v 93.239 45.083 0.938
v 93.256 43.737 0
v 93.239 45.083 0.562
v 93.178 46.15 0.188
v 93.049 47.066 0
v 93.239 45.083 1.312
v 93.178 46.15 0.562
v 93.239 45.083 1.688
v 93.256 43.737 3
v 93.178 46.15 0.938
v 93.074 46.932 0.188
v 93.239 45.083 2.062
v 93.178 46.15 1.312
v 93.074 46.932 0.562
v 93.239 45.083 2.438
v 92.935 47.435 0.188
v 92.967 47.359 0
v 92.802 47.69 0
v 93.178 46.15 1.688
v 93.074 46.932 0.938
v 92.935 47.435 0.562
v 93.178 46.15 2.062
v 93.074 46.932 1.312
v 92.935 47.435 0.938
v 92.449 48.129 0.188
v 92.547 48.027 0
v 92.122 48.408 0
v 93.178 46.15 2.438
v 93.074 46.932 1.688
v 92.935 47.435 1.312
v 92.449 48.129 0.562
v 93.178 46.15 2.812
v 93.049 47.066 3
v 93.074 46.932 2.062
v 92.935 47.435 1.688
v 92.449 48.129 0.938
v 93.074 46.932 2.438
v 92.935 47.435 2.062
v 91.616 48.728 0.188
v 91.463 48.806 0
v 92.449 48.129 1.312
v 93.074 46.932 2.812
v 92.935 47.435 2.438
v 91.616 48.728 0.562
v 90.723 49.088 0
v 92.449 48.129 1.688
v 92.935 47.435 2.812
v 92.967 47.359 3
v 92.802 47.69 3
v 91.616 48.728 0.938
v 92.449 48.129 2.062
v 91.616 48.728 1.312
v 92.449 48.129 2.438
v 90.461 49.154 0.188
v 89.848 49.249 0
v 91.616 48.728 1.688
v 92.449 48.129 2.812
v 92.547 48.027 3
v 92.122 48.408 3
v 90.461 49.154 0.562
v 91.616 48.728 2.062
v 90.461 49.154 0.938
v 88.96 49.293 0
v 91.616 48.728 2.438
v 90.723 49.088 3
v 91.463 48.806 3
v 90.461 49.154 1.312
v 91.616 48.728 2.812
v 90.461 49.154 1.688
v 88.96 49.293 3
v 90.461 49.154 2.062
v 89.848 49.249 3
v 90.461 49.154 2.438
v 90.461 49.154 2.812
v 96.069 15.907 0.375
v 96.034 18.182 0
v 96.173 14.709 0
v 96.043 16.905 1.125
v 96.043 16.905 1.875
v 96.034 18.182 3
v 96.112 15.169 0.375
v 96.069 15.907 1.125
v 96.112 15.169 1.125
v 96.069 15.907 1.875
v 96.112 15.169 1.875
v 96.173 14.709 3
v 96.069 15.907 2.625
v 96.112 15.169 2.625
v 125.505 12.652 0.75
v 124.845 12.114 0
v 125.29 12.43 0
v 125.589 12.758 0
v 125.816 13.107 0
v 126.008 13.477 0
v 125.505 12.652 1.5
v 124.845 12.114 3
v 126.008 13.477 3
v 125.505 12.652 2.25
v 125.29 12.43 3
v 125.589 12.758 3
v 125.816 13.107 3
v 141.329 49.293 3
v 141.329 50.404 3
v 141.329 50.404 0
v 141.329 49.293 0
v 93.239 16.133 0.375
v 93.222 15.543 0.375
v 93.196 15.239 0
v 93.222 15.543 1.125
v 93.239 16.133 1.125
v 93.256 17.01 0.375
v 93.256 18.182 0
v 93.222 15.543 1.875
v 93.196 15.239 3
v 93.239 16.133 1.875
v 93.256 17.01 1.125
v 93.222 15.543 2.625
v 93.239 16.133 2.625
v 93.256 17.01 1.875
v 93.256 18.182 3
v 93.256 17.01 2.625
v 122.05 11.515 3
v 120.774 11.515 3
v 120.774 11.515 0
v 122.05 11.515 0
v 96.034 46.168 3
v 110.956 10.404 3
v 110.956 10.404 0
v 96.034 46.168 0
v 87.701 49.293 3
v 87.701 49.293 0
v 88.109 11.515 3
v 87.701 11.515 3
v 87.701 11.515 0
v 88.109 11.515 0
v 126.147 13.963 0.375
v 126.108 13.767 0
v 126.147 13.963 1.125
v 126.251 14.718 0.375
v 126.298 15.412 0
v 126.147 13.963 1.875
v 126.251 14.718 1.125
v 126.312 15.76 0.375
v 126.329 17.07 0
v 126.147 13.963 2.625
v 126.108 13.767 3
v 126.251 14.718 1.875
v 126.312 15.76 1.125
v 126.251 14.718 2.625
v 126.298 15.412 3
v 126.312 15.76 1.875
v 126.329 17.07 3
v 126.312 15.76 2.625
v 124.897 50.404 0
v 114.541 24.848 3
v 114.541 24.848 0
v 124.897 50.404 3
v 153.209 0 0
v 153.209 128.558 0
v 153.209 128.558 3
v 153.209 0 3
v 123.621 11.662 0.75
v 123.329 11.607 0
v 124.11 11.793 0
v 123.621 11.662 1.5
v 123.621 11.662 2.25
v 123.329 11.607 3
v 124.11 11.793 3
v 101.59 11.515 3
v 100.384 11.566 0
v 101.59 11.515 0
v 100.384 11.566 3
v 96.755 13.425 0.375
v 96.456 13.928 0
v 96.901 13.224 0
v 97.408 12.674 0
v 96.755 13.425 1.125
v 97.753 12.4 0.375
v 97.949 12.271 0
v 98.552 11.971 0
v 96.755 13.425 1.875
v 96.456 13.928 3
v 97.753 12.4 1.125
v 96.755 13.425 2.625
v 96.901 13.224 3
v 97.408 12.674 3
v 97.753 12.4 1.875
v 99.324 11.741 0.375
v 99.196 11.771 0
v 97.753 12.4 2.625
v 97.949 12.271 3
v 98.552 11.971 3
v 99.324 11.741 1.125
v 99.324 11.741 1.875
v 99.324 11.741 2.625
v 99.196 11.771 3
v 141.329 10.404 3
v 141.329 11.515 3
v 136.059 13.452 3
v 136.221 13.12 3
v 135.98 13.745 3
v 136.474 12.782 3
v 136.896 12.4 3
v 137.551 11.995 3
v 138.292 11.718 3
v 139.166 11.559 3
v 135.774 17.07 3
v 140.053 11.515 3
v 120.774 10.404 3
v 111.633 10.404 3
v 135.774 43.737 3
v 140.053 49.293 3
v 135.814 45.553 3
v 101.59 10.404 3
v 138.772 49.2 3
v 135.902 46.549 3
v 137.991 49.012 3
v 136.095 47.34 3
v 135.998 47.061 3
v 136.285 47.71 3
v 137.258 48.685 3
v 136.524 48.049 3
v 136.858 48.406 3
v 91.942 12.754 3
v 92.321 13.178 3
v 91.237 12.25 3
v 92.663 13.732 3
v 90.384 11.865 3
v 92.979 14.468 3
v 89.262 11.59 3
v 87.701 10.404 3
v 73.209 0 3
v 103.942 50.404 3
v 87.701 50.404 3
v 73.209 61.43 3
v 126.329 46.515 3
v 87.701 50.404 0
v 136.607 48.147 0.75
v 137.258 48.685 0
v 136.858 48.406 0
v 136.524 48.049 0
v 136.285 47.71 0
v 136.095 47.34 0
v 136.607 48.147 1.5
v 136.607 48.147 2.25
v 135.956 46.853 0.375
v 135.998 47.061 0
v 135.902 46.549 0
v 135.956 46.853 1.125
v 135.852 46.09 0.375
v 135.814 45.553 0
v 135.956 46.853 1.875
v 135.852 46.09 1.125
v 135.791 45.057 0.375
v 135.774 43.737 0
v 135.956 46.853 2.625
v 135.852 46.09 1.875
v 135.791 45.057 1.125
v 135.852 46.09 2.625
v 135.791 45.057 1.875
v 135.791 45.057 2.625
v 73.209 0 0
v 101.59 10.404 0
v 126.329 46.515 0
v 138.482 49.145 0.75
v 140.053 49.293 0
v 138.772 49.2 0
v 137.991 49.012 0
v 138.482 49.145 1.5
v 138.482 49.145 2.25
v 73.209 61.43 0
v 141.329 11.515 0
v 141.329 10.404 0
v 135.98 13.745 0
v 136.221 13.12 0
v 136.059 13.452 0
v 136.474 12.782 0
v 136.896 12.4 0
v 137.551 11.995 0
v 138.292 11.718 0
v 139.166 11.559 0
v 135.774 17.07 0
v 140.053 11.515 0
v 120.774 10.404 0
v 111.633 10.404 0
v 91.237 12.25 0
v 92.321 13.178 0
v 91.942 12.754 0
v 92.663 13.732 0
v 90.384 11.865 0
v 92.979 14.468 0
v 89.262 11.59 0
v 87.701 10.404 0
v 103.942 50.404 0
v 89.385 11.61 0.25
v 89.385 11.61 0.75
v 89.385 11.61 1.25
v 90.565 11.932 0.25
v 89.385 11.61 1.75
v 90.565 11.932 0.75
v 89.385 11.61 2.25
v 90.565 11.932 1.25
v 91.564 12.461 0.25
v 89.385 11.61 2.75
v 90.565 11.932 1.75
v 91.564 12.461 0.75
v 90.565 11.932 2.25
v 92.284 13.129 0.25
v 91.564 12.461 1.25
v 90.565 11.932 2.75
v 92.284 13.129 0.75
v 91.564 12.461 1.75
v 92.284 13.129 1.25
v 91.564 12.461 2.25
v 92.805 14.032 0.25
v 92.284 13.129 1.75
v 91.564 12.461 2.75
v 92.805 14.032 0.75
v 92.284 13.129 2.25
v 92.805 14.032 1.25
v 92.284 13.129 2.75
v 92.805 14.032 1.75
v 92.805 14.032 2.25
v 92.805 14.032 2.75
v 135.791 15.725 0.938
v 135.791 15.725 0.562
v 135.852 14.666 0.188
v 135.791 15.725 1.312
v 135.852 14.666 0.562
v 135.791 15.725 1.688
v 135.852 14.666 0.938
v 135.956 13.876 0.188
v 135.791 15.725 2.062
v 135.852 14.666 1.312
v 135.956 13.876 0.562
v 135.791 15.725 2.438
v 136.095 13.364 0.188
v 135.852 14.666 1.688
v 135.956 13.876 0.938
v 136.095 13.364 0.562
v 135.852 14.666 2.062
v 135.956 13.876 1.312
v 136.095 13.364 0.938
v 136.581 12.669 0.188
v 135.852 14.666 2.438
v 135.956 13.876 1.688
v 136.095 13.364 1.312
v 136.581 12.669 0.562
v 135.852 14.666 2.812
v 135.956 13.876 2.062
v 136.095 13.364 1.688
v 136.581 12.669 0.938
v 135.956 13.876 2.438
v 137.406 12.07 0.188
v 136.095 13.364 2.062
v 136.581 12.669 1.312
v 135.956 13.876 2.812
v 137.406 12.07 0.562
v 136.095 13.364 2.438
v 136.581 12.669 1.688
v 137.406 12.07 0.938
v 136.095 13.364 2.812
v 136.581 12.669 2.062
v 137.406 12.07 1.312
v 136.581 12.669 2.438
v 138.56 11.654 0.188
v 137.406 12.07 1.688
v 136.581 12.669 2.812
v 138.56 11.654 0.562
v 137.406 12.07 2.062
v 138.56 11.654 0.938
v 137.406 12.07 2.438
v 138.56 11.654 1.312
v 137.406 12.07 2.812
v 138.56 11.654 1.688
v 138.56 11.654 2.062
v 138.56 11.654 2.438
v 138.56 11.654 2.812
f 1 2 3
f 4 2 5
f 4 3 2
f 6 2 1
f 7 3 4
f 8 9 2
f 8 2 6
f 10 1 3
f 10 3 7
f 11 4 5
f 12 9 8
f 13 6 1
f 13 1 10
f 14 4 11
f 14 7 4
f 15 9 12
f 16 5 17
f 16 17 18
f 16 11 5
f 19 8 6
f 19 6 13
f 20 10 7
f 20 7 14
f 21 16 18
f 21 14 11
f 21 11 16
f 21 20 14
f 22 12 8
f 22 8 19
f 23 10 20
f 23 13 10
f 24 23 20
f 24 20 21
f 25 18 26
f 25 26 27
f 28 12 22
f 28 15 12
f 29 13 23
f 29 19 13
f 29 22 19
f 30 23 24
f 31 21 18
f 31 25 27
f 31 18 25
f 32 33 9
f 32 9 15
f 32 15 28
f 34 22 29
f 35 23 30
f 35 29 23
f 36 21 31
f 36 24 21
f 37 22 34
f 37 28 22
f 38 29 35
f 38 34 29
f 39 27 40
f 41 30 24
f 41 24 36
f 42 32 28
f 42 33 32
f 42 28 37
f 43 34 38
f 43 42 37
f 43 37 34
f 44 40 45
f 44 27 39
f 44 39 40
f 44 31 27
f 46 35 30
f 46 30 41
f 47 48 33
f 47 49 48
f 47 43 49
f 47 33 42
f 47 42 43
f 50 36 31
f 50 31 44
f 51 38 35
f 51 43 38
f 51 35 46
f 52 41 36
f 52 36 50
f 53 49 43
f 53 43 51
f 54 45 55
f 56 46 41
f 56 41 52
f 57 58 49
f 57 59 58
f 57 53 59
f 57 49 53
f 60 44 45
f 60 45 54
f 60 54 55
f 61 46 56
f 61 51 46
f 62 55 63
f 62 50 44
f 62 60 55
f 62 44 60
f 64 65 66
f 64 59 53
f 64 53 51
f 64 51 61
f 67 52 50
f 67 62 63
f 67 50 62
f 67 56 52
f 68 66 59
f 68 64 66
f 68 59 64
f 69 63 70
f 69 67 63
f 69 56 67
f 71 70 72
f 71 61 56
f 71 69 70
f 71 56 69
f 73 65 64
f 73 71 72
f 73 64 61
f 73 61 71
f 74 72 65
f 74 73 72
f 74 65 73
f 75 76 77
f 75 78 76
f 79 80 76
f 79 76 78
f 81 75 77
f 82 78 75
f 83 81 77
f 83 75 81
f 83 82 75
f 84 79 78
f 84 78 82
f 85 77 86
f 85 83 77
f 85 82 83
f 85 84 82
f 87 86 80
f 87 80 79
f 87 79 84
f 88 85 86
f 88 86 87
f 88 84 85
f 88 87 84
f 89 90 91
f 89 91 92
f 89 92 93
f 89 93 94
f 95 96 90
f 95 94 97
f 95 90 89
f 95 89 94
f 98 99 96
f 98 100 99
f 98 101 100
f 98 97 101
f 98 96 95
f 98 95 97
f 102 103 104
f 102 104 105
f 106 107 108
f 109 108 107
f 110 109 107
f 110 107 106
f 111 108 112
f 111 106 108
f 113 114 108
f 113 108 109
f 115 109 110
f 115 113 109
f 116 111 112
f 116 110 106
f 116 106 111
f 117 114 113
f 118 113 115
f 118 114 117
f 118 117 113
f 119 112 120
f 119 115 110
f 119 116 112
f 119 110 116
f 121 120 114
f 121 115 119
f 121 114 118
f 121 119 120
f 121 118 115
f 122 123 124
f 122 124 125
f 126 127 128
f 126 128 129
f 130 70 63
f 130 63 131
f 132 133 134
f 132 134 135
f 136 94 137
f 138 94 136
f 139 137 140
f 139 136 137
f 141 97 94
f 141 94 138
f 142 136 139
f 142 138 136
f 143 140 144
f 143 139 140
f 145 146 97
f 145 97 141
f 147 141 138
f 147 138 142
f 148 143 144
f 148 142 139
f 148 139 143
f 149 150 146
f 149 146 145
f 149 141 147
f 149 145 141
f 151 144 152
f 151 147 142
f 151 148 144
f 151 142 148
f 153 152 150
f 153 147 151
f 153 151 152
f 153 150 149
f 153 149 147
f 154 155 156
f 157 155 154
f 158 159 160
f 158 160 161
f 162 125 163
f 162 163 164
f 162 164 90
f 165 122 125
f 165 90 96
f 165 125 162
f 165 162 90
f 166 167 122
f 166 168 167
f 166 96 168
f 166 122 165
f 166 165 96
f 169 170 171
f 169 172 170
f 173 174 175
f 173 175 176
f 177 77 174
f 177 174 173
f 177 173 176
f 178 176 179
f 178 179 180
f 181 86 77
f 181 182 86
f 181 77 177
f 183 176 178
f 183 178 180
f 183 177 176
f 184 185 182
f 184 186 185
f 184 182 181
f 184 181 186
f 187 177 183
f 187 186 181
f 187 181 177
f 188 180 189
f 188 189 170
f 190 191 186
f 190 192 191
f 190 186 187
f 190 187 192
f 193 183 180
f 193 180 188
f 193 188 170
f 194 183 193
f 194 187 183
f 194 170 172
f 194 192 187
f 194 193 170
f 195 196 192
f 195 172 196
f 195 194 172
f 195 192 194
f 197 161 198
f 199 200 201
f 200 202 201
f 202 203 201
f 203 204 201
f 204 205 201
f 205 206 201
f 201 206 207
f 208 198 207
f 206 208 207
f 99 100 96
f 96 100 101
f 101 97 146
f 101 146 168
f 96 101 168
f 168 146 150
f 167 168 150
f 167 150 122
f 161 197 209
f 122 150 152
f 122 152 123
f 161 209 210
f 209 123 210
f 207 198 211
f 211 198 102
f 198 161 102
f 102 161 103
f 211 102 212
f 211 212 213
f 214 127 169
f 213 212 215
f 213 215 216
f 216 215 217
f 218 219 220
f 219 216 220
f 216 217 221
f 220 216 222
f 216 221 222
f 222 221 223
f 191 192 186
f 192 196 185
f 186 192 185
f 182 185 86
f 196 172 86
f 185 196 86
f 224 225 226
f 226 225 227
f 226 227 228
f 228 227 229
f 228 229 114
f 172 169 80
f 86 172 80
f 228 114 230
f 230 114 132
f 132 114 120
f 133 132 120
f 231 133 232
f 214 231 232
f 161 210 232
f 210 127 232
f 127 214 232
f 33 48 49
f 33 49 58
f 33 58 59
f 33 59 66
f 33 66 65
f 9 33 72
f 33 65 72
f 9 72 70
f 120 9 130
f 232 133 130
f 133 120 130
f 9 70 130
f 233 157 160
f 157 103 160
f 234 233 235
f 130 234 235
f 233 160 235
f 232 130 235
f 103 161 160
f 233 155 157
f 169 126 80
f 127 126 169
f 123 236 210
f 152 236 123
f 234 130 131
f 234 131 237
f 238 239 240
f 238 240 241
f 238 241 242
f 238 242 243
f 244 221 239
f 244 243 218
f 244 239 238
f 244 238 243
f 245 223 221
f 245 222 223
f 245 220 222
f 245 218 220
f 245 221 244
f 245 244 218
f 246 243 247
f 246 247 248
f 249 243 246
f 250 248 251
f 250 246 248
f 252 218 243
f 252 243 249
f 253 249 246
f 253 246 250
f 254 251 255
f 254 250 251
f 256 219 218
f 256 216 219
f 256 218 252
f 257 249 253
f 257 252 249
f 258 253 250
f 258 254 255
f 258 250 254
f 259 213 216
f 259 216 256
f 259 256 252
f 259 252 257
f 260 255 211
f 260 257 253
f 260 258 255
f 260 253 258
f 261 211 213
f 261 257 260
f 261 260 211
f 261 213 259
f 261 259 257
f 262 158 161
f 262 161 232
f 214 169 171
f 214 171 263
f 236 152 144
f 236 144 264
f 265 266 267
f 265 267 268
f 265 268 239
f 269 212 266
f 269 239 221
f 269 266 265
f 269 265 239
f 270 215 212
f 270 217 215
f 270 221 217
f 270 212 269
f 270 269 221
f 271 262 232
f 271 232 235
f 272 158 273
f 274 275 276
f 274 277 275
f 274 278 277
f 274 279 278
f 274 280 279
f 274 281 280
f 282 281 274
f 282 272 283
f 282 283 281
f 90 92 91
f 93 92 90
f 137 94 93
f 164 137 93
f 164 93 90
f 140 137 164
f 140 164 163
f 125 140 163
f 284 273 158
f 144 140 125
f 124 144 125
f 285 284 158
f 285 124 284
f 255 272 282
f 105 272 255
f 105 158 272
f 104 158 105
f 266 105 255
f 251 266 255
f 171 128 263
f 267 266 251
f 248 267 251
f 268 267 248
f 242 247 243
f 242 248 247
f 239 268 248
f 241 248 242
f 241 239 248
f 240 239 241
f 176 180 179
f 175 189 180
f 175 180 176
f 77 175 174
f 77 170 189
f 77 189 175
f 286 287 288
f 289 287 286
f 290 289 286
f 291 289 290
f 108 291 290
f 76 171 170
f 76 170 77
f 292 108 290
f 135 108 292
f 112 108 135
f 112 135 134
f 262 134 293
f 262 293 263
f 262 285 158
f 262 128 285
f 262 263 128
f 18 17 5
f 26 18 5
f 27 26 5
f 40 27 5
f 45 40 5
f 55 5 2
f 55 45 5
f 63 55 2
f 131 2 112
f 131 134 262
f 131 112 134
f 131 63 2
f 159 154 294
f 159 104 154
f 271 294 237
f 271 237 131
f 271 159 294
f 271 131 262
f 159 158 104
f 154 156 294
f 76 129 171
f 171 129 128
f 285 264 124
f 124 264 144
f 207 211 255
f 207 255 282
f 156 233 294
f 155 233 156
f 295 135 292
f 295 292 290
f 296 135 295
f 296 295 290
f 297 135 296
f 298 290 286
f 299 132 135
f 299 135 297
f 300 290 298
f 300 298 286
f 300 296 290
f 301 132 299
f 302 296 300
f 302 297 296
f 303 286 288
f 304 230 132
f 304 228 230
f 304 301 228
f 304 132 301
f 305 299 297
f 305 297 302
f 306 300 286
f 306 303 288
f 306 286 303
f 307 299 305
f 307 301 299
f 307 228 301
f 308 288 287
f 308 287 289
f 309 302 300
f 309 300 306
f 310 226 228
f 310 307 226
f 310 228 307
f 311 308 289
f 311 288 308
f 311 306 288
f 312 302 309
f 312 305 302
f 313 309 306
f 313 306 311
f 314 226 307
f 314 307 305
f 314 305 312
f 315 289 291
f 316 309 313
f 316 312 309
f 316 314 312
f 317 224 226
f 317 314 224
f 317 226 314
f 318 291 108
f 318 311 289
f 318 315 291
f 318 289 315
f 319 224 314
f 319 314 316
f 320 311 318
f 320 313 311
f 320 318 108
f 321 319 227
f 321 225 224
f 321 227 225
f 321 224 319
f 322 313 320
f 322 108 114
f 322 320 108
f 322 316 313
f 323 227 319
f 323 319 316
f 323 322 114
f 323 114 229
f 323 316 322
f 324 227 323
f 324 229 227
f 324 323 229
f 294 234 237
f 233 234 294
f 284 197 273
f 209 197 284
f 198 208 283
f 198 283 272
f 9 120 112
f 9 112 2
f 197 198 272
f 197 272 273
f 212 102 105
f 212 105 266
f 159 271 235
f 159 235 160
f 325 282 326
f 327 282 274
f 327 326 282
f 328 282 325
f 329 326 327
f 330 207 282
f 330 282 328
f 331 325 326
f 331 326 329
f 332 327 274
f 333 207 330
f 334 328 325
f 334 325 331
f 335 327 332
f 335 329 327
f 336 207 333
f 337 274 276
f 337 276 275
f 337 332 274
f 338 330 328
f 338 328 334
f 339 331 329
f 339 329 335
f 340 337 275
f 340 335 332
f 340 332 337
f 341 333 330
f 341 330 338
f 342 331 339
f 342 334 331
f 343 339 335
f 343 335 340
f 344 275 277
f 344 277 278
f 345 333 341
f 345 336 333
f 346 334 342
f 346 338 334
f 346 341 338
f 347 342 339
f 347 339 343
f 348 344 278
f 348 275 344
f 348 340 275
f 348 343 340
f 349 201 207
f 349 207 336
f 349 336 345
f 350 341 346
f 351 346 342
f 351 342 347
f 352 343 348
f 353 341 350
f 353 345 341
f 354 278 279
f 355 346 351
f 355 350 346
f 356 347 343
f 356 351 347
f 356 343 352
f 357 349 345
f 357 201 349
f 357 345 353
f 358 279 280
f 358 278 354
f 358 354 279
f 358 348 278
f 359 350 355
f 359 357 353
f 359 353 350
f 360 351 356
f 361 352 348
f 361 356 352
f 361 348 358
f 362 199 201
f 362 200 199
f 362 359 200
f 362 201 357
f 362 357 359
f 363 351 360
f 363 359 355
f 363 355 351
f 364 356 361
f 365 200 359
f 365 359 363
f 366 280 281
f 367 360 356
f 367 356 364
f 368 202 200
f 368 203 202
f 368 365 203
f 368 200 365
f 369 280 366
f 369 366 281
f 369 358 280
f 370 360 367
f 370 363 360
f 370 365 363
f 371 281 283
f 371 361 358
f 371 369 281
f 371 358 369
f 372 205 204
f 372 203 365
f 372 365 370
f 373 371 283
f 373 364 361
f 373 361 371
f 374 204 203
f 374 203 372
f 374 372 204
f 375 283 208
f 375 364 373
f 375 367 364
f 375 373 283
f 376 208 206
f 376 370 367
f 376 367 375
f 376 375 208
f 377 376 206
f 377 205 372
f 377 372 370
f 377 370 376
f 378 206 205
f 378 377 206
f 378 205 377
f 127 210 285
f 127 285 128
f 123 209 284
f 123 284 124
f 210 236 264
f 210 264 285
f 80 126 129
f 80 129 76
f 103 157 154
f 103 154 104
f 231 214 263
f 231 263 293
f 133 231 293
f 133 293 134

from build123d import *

# Parameters (mm, degrees)
BOSS_EXTRUDE1_DEPTH = 3
CUT_EXTRUDE1_DEPTH  = 3


with BuildPart() as part:
    # Sketch1 → Boss-Extrude1 (new body)
    with BuildSketch(Plane.XY):
        Polygon((73.208888624, 61.429551443), (153.208888624, 128.557521937), (153.208888624, 0), (73.208888624, 0), align=None)
    extrude(amount=BOSS_EXTRUDE1_DEPTH)

    # Sketch2 → Cut-Extrude1 (cut)
    with BuildSketch(Plane.XY.offset(3)):
        with BuildLine():
            Line((114.541115695, 24.848188193), (124.897018473, 50.403743749))
            Line((124.897018473, 50.403743749), (141.32931014, 50.403743749))
            Line((141.32931014, 50.403743749), (141.32931014, 49.292632638))
            Line((141.32931014, 49.292632638), (140.053268473, 49.292632638))
            add(Edge.make_bspline(
                [(140.053268473, 49.292632638), (139.777913916, 49.287279798), (139.250682366, 49.277030519), (138.50450005, 49.164580552), (137.836795314, 48.980086144), (137.446503851, 48.781055794), (137.258129584, 48.684993749)],
                knots=[0, 0, 0, 0, 1.141675553, 2.186008389, 3.124476521, 4, 4, 4, 4], degree=3))
            add(Edge.make_bspline(
                [(137.258129584, 48.684993749), (137.138546651, 48.611673708), (136.896313732, 48.463153122), (136.596086342, 48.143316904), (136.306505192, 47.77978632), (136.167514751, 47.49054629), (136.09493514, 47.339507638)],
                knots=[0, 0, 0, 0, 0.92689117, 1.877555159, 2.891677582, 4, 4, 4, 4], degree=3))
            add(Edge.make_bspline(
                [(136.09493514, 47.339507638), (136.066604666, 47.270746405), (136.002068988, 47.114111084), (135.953061058, 46.830507124), (135.885354455, 46.485384284), (135.848925671, 46.066688386), (135.81416284, 45.583570509), (135.785726516, 45.030780096), (135.783396388, 44.408347319), (135.777079325, 43.968548261), (135.773754584, 43.737077082)],
                knots=[0, 0, 0, 0, 0.489997979, 1.116195674, 1.892481991, 2.815045661, 3.888305079, 5.094018216, 6.470549178, 8, 8, 8, 8], degree=3))
            Line((135.773754584, 43.737077082), (135.773754584, 17.070410415))
            add(Edge.make_bspline(
                [(135.773754584, 17.070410415), (135.777068496, 16.836044569), (135.783409978, 16.387563484), (135.785856575, 15.750682405), (135.813746186, 15.183392289), (135.849629159, 14.68588278), (135.884629459, 14.25556917), (135.954037997, 13.89602331), (136.002450601, 13.601431222), (136.111395778, 13.306263295), (136.290115509, 12.990352676), (136.581751189, 12.649113903), (136.961506114, 12.339403102), (137.415488976, 12.049727482), (137.954119231, 11.806372313), (138.580490143, 11.635507838), (139.288825096, 11.531956263), (139.789572455, 11.520754017), (140.053268473, 11.51485486)],
                knots=[0, 0, 0, 0, 1.348866943, 2.581183741, 3.664677528, 4.616142033, 5.452864999, 6.145451543, 6.723473748, 7.165912693, 7.948706057, 8.799395909, 9.733211935, 10.758727886, 11.891513365, 13.119773514, 14.483258592, 16, 16, 16, 16], degree=3))
            Line((140.053268473, 11.51485486), (141.32931014, 11.51485486))
            Line((141.32931014, 11.51485486), (141.32931014, 10.403743749))
            Line((141.32931014, 10.403743749), (120.773754584, 10.403743749))
            Line((120.773754584, 10.403743749), (120.773754584, 11.51485486))
            Line((120.773754584, 11.51485486), (122.049796251, 11.51485486))
            add(Edge.make_bspline(
                [(122.049796251, 11.51485486), (122.328100051, 11.519788417), (122.855467853, 11.52913719), (123.603877097, 11.645167884), (124.268464025, 11.825399233), (124.659288026, 12.020932183), (124.84493514, 12.113813193)],
                knots=[0, 0, 0, 0, 1.154913481, 2.188486767, 3.139504729, 4, 4, 4, 4], degree=3))
            add(Edge.make_bspline(
                [(124.84493514, 12.113813193), (124.963688543, 12.187882908), (125.205993367, 12.339014992), (125.522548533, 12.651091277), (125.789467027, 13.038073651), (125.933569987, 13.327111023), (126.008129584, 13.476660415)],
                knots=[0, 0, 0, 0, 0.919236091, 1.875612259, 2.900831081, 4, 4, 4, 4], degree=3))
            add(Edge.make_bspline(
                [(126.008129584, 13.476660415), (126.036482482, 13.545417481), (126.101069242, 13.70204331), (126.149089491, 13.982919397), (126.218719843, 14.324814277), (126.253857147, 14.740845033), (126.289303378, 15.226779271), (126.316933013, 15.779620532), (126.319830601, 16.402028189), (126.326027204, 16.838937549), (126.32931014, 17.070410415)],
                knots=[0, 0, 0, 0, 0.491154816, 1.118830903, 1.878082211, 2.802823963, 3.878617243, 5.106317376, 6.466938293, 8, 8, 8, 8], degree=3))
            Line((126.32931014, 17.070410415), (126.32931014, 46.51485486))
            Line((126.32931014, 46.51485486), (111.633129584, 10.403743749))
            Line((111.633129584, 10.403743749), (110.956046251, 10.403743749))
            Line((110.956046251, 10.403743749), (96.034171251, 46.167632638))
            Line((96.034171251, 46.167632638), (96.034171251, 18.181521526))
            add(Edge.make_bspline(
                [(96.034171251, 18.181521526), (96.033190657, 17.958710944), (96.031318524, 17.533324619), (96.043902342, 16.928659169), (96.047406401, 16.39312255), (96.069662028, 15.924639846), (96.080811254, 15.524733601), (96.111073311, 15.192481376), (96.131378595, 14.927855243), (96.160396628, 14.77570005), (96.17306014, 14.709299304)],
                knots=[0, 0, 0, 0, 1.537276861, 2.934943876, 4.172912213, 5.231790959, 6.170977958, 6.931994631, 7.533920913, 8, 8, 8, 8], degree=3))
            add(Edge.make_bspline(
                [(96.17306014, 14.709299304), (96.24207751, 14.479788853), (96.378508228, 14.02610197), (96.742519421, 13.413991548), (97.187520669, 12.855403415), (97.757425274, 12.365276459), (98.475961448, 11.965325093), (99.371323366, 11.71141388), (100.422324645, 11.533357851), (101.183703417, 11.521290215), (101.589726807, 11.51485486)],
                knots=[0, 0, 0, 0, 0.837202277, 1.654947254, 2.477083681, 3.333000774, 4.272846669, 5.334753209, 6.578693578, 8, 8, 8, 8], degree=3))
            Line((101.589726807, 11.51485486), (101.589726807, 10.403743749))
            Line((101.589726807, 10.403743749), (87.700837918, 10.403743749))
            Line((87.700837918, 10.403743749), (87.700837918, 11.51485486))
            Line((87.700837918, 11.51485486), (88.108824029, 11.51485486))
            add(Edge.make_bspline(
                [(88.108824029, 11.51485486), (88.326119555, 11.515958146), (88.753567478, 11.518128449), (89.380690167, 11.601723744), (89.986576932, 11.729328159), (90.561772547, 11.920334861), (91.096566285, 12.153779677), (91.557403695, 12.449291329), (91.967729934, 12.754532224), (92.297594099, 13.128470853), (92.579118316, 13.5527757), (92.820072335, 14.047801623), (93.041761578, 14.61157873), (93.142726903, 15.023158324), (93.195629584, 15.238813193)],
                knots=[0, 0, 0, 0, 1.126221598, 2.215421052, 3.275368575, 4.333933395, 5.355119513, 6.292312747, 7.169137372, 7.998144275, 8.864108371, 9.803942606, 10.849334424, 12, 12, 12, 12], degree=3))
            add(Edge.make_bspline(
                [(93.195629584, 15.238813193), (93.202214921, 15.276348515), (93.219826457, 15.376731332), (93.220721213, 15.565972366), (93.23219697, 15.826075335), (93.239616075, 16.156072479), (93.248148475, 16.55823406), (93.259127372, 17.03274832), (93.255551074, 17.582569372), (93.256100465, 17.973190342), (93.256393473, 18.181521526)],
                knots=[0, 0, 0, 0, 0.310187739, 0.829552458, 1.537439513, 2.433908972, 3.518989584, 4.816276497, 6.302014132, 8, 8, 8, 8], degree=3))
            Line((93.256393473, 18.181521526), (93.256393473, 43.737077082))
            add(Edge.make_bspline(
                [(93.256393473, 43.737077082), (93.253065361, 43.971441664), (93.246696704, 44.419920331), (93.244433013, 45.05681769), (93.215819555, 45.626940178), (93.181647654, 46.124609011), (93.144463395, 46.554666597), (93.077514309, 46.908858762), (93.026352876, 47.199976304), (92.918911223, 47.492567379), (92.740012849, 47.808500991), (92.448251073, 48.149453568), (92.067439137, 48.462006467), (91.607344322, 48.747016559), (91.066151715, 48.990534713), (90.439896314, 49.17604788), (89.726495128, 49.273958557), (89.223100805, 49.286215027), (88.959518473, 49.292632638)],
                knots=[0, 0, 0, 0, 1.347272511, 2.578132646, 3.660345685, 4.627277135, 5.446463535, 6.138231406, 6.69929032, 7.141206279, 7.92307434, 8.772758631, 9.705470838, 10.743855472, 11.875301939, 13.106723778, 14.485051461, 16, 16, 16, 16], degree=3))
            Line((88.959518473, 49.292632638), (87.700837918, 49.292632638))
            Line((87.700837918, 49.292632638), (87.700837918, 50.403743749))
            Line((87.700837918, 50.403743749), (103.942157362, 50.403743749))
            Line((103.942157362, 50.403743749), (114.541115695, 24.848188193))
        make_face()
    extrude(amount=-CUT_EXTRUDE1_DEPTH, mode=Mode.SUBTRACT)


solid = part.part
